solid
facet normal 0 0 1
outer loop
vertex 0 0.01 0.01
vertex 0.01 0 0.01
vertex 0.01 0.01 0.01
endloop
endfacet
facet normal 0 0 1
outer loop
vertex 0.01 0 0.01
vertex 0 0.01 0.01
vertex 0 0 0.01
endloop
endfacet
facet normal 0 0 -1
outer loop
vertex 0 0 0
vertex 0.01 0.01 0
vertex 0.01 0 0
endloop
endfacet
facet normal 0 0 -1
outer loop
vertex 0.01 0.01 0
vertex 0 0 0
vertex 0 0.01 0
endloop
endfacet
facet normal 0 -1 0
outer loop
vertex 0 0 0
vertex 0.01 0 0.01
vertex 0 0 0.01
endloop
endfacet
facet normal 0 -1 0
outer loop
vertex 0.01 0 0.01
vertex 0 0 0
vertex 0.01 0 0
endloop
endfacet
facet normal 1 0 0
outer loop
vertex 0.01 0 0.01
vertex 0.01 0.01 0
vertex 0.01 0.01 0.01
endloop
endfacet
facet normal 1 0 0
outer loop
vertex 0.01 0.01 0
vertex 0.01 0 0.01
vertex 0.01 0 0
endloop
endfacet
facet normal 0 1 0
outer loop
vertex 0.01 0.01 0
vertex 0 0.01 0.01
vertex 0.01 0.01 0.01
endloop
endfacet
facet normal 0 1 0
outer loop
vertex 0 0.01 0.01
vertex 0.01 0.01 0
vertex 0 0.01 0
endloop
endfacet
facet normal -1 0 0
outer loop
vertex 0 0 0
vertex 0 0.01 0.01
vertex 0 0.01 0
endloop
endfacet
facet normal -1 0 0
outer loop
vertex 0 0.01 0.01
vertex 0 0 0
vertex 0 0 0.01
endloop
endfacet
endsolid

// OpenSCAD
/***
 * @function tooth_generation_segment_bounds_equivalence
 * @brief Prove ordered broad-phase and exact validation equivalence for crossing, duplicate and near-tolerance polygons.
 * Source: [`tooth/generation/segment_bounds_equivalence.scad`](tooth/generation/segment_bounds_equivalence.scad)
 */
include <../../../src/common/curve_gears_math.scad>
polygons=[
    [[0,0],[4,4],[0,4],[4,0]],
    [[0,0],[3,0],[3,3],[0,3],[0,0],[3,0],[3,-2],[0,-2]],
    [[0,0],[1,0],[1,0],[1,1],[0,1]],
    [[0,0],[1,0],[2,0],[3,0]],
    [[0,0],[10,0],[10,10],[0,10],[0,1e-8],[10,1e-8],[10,9],[0,9]],
    [for(i=[0:127]) [10*cos(360*i/128),10*sin(360*i/128)]],
    [for(i=[0:127]) let(t=360*i/128,r=10*(1+.35*cos(5*t))) [r*cos(t),r*sin(t)]],
    [for(i=[0:63]) let(t=360*((i*27)%64)/64) [10*cos(t),10*sin(t)]]
];
queries=[[[0,-12],[0,12],[.1,12]],[[9.99999999,-1],[10.00000001,1],[11,0]],[[20,20],[21,20],[20,21]]];
for(k=[0:len(polygons)-1]) {
    p=polygons[k];
    assert(_cg_polygon_intersections(p)==_cg_polygon_intersections_direct(p),str("ordered polygon hits differ: case=",k));
    assert(_cg_has_duplicate_edge(p)==_cg_has_duplicate_edge_direct(p),str("duplicate-edge result differs: case=",k));
    for(q=queries)
        assert(_cg_tooth_body_intersections(q,p)==_cg_tooth_body_intersections_direct(q,p),
            str("ordered boundary hits differ: case=",k));
}
// Every accepted pair in the reference broad phase must be returned in order.
for(p=polygons) {
    tree=_cg_segment_bounds_tree(p);
    for(i=[0:len(p)-1]) {
        reference=[for(j=[0:len(p)-1])
            if(_cg_bbox_segments_overlap(p[i],p[(i+1)%len(p)],p[j],p[(j+1)%len(p)])) j];
        assert(_cg_segment_bounds_candidates(tree,p[i],p[(i+1)%len(p)])==reference,"broad-phase leaf candidates/order differ");
    }
}
echo("PASS: exact candidate, crossing, duplicate and boundary records for eight adversarial polygons");
cube(.01);
